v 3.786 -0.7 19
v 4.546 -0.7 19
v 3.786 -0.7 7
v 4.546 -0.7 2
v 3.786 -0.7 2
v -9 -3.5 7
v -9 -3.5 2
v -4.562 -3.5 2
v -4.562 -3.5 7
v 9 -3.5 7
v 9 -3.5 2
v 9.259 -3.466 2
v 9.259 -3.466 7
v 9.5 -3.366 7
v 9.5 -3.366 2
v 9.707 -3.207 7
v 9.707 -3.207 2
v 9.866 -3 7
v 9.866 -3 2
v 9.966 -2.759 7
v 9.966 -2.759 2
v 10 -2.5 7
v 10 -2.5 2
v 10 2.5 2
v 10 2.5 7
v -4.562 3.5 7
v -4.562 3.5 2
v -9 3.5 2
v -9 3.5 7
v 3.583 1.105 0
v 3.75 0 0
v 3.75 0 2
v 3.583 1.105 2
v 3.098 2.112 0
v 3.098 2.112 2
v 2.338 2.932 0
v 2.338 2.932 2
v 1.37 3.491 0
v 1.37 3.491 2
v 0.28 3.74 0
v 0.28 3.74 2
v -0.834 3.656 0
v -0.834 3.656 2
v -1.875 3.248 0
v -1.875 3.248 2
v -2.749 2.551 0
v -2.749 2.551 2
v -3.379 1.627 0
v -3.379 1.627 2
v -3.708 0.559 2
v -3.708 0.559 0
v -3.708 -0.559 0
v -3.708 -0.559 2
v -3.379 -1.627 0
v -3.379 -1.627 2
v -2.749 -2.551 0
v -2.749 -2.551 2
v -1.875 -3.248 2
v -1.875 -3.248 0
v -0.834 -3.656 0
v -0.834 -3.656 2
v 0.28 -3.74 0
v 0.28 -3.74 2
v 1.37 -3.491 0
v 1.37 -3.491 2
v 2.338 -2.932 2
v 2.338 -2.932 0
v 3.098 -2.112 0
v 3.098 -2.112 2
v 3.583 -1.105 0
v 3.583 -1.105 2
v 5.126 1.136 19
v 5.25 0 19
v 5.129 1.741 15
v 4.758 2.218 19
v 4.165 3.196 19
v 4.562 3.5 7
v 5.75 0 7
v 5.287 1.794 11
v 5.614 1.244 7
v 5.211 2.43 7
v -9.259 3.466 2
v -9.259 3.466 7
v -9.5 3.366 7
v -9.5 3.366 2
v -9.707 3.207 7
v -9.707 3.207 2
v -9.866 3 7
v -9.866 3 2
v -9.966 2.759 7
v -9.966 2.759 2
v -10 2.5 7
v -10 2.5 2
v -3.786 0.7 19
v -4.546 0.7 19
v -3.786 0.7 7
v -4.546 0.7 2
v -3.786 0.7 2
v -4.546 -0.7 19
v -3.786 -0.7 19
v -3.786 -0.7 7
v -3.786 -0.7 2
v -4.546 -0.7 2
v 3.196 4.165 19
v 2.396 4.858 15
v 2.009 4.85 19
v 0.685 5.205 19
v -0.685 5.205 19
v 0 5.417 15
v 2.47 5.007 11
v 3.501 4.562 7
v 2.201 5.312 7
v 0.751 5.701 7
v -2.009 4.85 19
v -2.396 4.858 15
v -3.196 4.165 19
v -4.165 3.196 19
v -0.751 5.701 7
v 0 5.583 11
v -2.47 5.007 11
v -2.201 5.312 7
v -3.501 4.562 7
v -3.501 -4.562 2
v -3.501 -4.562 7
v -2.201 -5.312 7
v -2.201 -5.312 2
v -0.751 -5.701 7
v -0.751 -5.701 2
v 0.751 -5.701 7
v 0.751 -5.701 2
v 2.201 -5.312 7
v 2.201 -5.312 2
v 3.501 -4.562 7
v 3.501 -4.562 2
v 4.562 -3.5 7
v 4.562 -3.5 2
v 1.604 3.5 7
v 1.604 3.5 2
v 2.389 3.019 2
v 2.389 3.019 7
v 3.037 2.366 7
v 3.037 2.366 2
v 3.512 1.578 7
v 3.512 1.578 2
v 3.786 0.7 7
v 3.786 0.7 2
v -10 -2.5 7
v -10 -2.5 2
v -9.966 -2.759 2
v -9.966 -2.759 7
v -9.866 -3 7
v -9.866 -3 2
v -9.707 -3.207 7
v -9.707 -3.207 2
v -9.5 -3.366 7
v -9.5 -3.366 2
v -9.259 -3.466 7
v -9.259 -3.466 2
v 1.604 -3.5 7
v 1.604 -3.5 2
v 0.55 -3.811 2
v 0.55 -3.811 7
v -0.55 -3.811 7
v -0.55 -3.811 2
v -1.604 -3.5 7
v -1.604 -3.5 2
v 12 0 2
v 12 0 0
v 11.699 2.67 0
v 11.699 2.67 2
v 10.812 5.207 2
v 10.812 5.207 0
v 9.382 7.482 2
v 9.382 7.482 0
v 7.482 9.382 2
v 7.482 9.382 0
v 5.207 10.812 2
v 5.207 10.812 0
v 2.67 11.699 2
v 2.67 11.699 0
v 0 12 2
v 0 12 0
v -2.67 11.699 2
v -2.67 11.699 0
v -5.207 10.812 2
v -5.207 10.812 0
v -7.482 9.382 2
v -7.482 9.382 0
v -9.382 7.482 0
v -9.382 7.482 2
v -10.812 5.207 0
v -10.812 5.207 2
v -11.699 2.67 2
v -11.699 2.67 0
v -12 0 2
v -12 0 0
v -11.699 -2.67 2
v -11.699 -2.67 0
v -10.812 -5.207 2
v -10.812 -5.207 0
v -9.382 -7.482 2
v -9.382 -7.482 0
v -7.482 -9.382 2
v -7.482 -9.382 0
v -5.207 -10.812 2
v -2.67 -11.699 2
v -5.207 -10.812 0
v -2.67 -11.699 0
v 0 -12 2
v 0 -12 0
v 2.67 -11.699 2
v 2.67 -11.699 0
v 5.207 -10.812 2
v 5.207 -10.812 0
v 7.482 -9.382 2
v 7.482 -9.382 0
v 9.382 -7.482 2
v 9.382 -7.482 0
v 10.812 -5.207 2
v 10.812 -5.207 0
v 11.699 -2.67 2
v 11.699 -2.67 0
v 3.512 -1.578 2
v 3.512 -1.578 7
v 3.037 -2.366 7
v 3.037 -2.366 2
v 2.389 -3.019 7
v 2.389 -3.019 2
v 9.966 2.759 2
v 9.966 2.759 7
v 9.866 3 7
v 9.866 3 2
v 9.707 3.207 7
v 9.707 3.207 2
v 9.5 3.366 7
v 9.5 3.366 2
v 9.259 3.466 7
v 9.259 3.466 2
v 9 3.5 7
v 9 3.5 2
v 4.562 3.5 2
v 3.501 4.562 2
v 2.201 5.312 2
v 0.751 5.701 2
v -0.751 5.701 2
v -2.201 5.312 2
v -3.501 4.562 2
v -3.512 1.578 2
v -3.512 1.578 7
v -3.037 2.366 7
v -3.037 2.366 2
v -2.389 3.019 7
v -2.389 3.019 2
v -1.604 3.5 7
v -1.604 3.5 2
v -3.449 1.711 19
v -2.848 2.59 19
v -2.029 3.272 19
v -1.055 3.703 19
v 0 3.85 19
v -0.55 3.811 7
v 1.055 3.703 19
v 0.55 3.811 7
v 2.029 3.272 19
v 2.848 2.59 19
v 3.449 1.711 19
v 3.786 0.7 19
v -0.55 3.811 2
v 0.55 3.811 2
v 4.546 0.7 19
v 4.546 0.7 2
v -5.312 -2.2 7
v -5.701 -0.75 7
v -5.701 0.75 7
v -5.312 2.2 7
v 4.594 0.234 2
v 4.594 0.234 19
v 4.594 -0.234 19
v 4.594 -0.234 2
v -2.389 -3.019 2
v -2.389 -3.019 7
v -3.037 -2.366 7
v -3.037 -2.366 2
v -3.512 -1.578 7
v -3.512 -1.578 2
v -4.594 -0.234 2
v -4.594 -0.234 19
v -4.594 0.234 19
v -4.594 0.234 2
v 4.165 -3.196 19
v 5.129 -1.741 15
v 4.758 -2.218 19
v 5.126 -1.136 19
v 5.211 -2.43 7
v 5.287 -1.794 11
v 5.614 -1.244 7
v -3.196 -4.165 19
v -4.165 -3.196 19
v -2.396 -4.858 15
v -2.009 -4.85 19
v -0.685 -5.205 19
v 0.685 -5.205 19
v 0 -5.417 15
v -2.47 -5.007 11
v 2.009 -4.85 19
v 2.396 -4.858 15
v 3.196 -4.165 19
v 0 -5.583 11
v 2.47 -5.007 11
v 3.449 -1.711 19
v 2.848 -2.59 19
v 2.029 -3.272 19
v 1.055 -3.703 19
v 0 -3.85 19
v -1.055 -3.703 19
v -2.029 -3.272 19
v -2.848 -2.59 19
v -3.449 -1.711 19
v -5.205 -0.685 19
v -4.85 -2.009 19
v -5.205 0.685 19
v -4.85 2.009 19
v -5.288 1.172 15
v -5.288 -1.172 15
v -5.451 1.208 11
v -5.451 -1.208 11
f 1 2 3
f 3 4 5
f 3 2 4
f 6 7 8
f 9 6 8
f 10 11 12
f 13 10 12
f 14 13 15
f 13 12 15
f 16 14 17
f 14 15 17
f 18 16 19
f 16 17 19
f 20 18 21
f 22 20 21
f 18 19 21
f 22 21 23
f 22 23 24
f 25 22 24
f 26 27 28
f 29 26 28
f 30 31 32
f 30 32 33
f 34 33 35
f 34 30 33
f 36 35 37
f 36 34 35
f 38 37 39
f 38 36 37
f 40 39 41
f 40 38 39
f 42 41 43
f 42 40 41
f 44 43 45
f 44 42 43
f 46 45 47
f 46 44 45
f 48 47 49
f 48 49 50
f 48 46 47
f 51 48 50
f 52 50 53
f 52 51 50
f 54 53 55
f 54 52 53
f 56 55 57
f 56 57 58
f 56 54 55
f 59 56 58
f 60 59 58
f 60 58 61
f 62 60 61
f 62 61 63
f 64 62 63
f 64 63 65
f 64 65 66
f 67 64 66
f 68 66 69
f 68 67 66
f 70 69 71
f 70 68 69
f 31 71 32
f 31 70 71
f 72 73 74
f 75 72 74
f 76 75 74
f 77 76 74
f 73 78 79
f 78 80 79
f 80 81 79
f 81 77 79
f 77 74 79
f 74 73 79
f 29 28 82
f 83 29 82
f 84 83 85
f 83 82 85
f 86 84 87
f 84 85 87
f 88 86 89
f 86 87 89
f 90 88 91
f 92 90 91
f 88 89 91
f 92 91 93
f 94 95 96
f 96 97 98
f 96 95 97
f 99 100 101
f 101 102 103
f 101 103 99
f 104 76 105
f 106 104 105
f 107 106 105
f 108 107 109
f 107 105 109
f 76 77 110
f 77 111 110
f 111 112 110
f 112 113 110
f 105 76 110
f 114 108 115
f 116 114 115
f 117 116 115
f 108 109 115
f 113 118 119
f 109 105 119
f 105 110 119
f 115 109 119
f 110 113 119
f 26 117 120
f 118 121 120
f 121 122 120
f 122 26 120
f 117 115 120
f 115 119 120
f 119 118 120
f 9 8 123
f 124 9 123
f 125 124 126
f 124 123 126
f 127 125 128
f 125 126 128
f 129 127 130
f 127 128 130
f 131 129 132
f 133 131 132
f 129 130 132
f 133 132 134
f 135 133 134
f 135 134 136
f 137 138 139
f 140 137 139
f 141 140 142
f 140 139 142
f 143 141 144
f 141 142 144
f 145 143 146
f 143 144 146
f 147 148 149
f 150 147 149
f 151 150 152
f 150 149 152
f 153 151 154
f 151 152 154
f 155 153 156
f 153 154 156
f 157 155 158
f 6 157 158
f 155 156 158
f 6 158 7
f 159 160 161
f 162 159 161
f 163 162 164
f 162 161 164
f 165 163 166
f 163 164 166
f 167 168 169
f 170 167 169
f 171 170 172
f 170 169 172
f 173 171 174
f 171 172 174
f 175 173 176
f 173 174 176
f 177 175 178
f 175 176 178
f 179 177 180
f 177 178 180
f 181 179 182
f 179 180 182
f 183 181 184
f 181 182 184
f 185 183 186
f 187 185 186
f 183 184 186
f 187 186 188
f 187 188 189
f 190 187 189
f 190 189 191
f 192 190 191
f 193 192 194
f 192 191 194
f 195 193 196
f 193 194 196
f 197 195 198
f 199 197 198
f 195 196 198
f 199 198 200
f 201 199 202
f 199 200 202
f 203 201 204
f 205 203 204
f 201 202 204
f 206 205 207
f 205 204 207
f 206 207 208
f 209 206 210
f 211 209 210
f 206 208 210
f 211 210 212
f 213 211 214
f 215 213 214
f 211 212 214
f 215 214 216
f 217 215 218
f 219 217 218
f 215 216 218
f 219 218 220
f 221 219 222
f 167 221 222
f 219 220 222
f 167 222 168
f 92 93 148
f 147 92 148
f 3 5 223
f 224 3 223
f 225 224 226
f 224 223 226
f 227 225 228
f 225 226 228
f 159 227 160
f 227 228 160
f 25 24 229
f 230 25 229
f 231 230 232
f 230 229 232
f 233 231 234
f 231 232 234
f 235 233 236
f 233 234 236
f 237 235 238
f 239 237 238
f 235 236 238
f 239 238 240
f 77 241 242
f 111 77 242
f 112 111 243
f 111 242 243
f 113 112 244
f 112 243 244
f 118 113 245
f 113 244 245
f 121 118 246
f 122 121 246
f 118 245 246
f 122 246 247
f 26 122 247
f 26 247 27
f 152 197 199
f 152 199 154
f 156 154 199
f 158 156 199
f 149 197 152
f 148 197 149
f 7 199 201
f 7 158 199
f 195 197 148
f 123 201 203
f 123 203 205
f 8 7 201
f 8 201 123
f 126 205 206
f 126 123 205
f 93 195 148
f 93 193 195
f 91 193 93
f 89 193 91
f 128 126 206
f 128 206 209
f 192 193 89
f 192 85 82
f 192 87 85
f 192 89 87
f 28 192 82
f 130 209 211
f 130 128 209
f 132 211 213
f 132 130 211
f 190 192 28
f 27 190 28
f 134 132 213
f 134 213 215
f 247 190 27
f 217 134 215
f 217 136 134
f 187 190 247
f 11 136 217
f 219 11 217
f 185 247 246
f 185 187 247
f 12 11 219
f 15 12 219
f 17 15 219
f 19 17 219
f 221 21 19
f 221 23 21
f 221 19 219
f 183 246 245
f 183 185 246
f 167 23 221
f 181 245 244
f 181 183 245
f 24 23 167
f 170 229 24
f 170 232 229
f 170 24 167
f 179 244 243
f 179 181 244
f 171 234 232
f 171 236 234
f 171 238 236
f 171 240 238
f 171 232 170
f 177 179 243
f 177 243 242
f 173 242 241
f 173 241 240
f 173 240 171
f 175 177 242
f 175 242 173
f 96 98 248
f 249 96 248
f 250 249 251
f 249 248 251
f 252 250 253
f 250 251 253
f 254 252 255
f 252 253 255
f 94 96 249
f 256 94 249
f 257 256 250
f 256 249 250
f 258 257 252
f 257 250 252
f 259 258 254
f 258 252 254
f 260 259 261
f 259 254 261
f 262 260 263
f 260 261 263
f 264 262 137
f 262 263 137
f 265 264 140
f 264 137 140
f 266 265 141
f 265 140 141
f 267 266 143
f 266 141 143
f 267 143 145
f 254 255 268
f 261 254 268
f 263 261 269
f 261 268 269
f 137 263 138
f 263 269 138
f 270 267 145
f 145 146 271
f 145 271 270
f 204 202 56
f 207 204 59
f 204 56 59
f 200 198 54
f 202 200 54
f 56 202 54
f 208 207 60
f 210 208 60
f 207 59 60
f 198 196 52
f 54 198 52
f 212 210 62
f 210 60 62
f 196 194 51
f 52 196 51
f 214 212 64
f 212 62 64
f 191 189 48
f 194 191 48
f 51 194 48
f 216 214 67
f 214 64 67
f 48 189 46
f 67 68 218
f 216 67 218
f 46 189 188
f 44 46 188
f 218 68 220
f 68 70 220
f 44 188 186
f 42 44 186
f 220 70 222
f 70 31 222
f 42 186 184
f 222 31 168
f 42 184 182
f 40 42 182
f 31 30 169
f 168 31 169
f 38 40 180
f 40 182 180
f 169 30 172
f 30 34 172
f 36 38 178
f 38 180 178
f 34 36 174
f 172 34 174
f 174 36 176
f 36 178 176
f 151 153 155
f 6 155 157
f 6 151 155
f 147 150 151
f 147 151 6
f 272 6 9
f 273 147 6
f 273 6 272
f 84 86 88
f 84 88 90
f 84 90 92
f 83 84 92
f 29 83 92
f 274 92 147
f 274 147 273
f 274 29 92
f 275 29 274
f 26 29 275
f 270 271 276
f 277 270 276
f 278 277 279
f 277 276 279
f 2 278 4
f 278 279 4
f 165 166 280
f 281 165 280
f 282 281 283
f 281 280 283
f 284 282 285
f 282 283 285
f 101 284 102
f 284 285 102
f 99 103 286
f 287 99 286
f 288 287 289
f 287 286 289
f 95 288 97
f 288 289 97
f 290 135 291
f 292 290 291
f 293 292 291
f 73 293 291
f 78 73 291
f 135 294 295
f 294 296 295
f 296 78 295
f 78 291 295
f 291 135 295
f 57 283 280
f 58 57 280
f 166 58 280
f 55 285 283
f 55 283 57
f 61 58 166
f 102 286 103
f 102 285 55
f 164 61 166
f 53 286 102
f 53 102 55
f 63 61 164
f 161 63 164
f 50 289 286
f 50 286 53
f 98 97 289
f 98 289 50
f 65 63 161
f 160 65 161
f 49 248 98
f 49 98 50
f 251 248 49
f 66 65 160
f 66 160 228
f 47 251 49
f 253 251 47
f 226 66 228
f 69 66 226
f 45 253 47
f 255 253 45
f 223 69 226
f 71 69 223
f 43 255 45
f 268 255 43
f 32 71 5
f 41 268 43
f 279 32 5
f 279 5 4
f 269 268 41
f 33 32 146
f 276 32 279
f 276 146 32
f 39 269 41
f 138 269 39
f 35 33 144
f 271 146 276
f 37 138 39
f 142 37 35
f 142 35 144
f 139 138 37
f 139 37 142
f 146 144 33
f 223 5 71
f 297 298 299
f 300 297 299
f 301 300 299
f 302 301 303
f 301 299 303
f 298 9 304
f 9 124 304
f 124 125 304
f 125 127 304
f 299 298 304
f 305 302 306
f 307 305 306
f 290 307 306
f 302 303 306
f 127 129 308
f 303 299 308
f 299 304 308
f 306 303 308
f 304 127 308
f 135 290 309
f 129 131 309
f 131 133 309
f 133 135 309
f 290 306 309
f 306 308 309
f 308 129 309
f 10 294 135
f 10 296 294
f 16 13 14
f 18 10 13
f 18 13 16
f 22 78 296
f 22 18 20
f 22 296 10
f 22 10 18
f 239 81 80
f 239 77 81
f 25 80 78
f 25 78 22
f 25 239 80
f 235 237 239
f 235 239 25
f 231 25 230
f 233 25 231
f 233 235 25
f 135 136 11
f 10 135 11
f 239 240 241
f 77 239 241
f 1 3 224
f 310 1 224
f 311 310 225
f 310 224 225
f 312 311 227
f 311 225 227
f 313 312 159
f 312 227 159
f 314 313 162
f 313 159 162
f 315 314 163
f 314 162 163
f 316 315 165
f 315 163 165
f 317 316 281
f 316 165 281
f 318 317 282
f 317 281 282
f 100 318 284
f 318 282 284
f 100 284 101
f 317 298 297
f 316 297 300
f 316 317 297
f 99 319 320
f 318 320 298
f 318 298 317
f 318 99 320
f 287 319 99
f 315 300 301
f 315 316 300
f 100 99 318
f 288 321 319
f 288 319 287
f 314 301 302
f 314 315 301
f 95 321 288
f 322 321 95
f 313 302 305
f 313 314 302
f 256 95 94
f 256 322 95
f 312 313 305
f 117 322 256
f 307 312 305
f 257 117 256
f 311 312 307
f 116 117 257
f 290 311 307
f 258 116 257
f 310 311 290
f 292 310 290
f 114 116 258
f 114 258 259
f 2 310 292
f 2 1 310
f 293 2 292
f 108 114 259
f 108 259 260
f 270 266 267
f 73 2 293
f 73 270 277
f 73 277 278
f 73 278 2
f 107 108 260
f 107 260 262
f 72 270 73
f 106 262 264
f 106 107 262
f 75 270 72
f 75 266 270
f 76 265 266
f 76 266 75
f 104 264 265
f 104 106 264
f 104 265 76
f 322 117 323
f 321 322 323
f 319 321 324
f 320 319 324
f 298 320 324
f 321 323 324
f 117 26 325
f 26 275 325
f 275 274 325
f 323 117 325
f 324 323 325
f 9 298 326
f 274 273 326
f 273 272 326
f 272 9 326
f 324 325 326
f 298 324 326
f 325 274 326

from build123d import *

# Parameters (mm, degrees)
F0_R     = 12
F0_R_2   = 3.75
F1_DEPTH = 2
F3_DEPTH = 5
F5_DEPTH = 12
F6_SIZE2 = 11.99999
F6_SIZE  = 0.49999


# Not quite as in the source:
# - a fillet or chamfer is up to 0.001 mm smaller than in the source, because OpenCascade refuses the exact size


with BuildPart() as f1:
    # F0 (on Top) → F1 (new body)
    with BuildSketch(Plane.XY):
        Circle(F0_R)
        Circle(F0_R_2, mode=Mode.SUBTRACT)
    extrude(amount=F1_DEPTH)

    # F2 (on face) → F3 (join)
    with BuildSketch(Plane.XY.offset(2)):
        with BuildLine():
            Line((-9, -3.5), (-4.5620718977, -3.5))
            ThreePointArc((-4.5620718977, -3.5), (-5.75, 0), (-4.5620718977, 3.5))
            Line((-4.5620718977, 3.5), (-9, 3.5))
            ThreePointArc((-9, 3.5), (-9.7071067812, 3.2071067812), (-10, 2.5))
            Line((-10, 2.5), (-10, 0))
            Line((-10, 0), (-10, -2.5))
            ThreePointArc((-10, -2.5), (-9.7071067812, -3.2071067812), (-9, -3.5))
        make_face()
        with BuildLine():
            Line((-4.5620718977, -3.5), (-1.6039014932, -3.5))
            ThreePointArc((-1.6039014932, -3.5), (-3.0368237131, -2.3664745373), (-3.7858288392, -0.7))
            Line((-3.7858288392, -0.7), (-4, -0.7))
            Line((-4, -0.7), (-4.5464271687, -0.7))
            ThreePointArc((-4.5464271687, -0.7), (-4.6, 0), (-4.5464271687, 0.7))
            Line((-4.5464271687, 0.7), (-3.7858288392, 0.7))
            ThreePointArc((-3.7858288392, 0.7), (-3.0368237131, 2.3664745373), (-1.6039014932, 3.5))
            Line((-1.6039014932, 3.5), (-4.5620718977, 3.5))
            ThreePointArc((-4.5620718977, 3.5), (-5.75, 0), (-4.5620718977, -3.5))
        make_face()
        with BuildLine():
            Line((4.5620718977, -3.5), (1.6039014932, -3.5))
            ThreePointArc((1.6039014932, -3.5), (0, -3.85), (-1.6039014932, -3.5))
            Line((-1.6039014932, -3.5), (-4.5620718977, -3.5))
            ThreePointArc((-4.5620718977, -3.5), (0, -5.75), (4.5620718977, -3.5))
        make_face()
        with BuildLine():
            ThreePointArc((5.75, 0), (5.4449248577, -1.8480512152), (4.5620718977, -3.5))
            Line((4.5620718977, -3.5), (9, -3.5))
            ThreePointArc((9, -3.5), (9.7071067812, -3.2071067812), (10, -2.5))
            Line((10, -2.5), (10, 0))
            Line((10, 0), (10, 2.5))
            ThreePointArc((10, 2.5), (9.7071067812, 3.2071067812), (9, 3.5))
            Line((9, 3.5), (4.5620718977, 3.5))
            ThreePointArc((4.5620718977, 3.5), (5.4449248577, 1.8480512152), (5.75, 0))
        make_face()
        with BuildLine():
            ThreePointArc((3.7858288392, -0.7), (3.0368237131, -2.3664745373), (1.6039014932, -3.5))
            Line((1.6039014932, -3.5), (4.5620718977, -3.5))
            ThreePointArc((4.5620718977, -3.5), (5.4449248577, -1.8480512152), (5.75, 0))
            ThreePointArc((5.75, 0), (5.4449248577, 1.8480512152), (4.5620718977, 3.5))
            Line((4.5620718977, 3.5), (1.6039014932, 3.5))
            ThreePointArc((1.6039014932, 3.5), (3.0368237131, 2.3664745373), (3.7858288392, 0.7))
            Line((3.7858288392, 0.7), (4.5464271687, 0.7))
            ThreePointArc((4.5464271687, 0.7), (4.6, 0), (4.5464271687, -0.7))
            Line((4.5464271687, -0.7), (4, -0.7))
            Line((4, -0.7), (3.7858288392, -0.7))
        make_face()
        with BuildLine():
            Line((-4.5620718977, 3.5), (-1.6039014932, 3.5))
            ThreePointArc((-1.6039014932, 3.5), (0, 3.85), (1.6039014932, 3.5))
            Line((1.6039014932, 3.5), (4.5620718977, 3.5))
            ThreePointArc((4.5620718977, 3.5), (0, 5.75), (-4.5620718977, 3.5))
        make_face()
    extrude(amount=F3_DEPTH)

    # F4 (on face) → F5 (join)
    with BuildSketch(Plane.XY.offset(7)):
        with BuildLine():
            ThreePointArc((4.5620718977, -3.5), (5.4449248577, -1.8480512152), (5.75, 0))
            ThreePointArc((5.75, 0), (5.4449248577, 1.8480512152), (4.5620718977, 3.5))
            ThreePointArc((4.5620718977, 3.5), (0, 5.75), (-4.5620718977, 3.5))
            ThreePointArc((-4.5620718977, 3.5), (-5.75, 0), (-4.5620718977, -3.5))
            ThreePointArc((-4.5620718977, -3.5), (0, -5.75), (4.5620718977, -3.5))
        make_face()
        with BuildLine():
            ThreePointArc((-3.7858288392, 0.7), (0, 3.85), (3.7858288392, 0.7))
            Line((3.7858288392, 0.7), (4.5464271687, 0.7))
            ThreePointArc((4.5464271687, 0.7), (4.6, 0), (4.5464271687, -0.7))
            Line((4.5464271687, -0.7), (3.7858288392, -0.7))
            ThreePointArc((3.7858288392, -0.7), (0, -3.85), (-3.7858288392, -0.7))
            Line((-3.7858288392, -0.7), (-4.5464271687, -0.7))
            ThreePointArc((-4.5464271687, -0.7), (-4.6, 0), (-4.5464271687, 0.7))
            Line((-4.5464271687, 0.7), (-3.7858288392, 0.7))
        make_face(mode=Mode.SUBTRACT)
    extrude(amount=F5_DEPTH)

    # F6 (size 0.5 and 12 in the source; OpenCascade refuses exactly that, so slightly less here)
    f6_edges = [f1.edges().sort_by_distance(p)[0] for p in [
        (-4.562072, -3.5, 19),
    ]]
    f6_side = f1.faces().sort_by_distance((-4.433037, -3.401005, 19))[0]
    chamfer(f6_edges, length=F6_SIZE, length2=F6_SIZE2, reference=f6_side)


solid = f1.part
